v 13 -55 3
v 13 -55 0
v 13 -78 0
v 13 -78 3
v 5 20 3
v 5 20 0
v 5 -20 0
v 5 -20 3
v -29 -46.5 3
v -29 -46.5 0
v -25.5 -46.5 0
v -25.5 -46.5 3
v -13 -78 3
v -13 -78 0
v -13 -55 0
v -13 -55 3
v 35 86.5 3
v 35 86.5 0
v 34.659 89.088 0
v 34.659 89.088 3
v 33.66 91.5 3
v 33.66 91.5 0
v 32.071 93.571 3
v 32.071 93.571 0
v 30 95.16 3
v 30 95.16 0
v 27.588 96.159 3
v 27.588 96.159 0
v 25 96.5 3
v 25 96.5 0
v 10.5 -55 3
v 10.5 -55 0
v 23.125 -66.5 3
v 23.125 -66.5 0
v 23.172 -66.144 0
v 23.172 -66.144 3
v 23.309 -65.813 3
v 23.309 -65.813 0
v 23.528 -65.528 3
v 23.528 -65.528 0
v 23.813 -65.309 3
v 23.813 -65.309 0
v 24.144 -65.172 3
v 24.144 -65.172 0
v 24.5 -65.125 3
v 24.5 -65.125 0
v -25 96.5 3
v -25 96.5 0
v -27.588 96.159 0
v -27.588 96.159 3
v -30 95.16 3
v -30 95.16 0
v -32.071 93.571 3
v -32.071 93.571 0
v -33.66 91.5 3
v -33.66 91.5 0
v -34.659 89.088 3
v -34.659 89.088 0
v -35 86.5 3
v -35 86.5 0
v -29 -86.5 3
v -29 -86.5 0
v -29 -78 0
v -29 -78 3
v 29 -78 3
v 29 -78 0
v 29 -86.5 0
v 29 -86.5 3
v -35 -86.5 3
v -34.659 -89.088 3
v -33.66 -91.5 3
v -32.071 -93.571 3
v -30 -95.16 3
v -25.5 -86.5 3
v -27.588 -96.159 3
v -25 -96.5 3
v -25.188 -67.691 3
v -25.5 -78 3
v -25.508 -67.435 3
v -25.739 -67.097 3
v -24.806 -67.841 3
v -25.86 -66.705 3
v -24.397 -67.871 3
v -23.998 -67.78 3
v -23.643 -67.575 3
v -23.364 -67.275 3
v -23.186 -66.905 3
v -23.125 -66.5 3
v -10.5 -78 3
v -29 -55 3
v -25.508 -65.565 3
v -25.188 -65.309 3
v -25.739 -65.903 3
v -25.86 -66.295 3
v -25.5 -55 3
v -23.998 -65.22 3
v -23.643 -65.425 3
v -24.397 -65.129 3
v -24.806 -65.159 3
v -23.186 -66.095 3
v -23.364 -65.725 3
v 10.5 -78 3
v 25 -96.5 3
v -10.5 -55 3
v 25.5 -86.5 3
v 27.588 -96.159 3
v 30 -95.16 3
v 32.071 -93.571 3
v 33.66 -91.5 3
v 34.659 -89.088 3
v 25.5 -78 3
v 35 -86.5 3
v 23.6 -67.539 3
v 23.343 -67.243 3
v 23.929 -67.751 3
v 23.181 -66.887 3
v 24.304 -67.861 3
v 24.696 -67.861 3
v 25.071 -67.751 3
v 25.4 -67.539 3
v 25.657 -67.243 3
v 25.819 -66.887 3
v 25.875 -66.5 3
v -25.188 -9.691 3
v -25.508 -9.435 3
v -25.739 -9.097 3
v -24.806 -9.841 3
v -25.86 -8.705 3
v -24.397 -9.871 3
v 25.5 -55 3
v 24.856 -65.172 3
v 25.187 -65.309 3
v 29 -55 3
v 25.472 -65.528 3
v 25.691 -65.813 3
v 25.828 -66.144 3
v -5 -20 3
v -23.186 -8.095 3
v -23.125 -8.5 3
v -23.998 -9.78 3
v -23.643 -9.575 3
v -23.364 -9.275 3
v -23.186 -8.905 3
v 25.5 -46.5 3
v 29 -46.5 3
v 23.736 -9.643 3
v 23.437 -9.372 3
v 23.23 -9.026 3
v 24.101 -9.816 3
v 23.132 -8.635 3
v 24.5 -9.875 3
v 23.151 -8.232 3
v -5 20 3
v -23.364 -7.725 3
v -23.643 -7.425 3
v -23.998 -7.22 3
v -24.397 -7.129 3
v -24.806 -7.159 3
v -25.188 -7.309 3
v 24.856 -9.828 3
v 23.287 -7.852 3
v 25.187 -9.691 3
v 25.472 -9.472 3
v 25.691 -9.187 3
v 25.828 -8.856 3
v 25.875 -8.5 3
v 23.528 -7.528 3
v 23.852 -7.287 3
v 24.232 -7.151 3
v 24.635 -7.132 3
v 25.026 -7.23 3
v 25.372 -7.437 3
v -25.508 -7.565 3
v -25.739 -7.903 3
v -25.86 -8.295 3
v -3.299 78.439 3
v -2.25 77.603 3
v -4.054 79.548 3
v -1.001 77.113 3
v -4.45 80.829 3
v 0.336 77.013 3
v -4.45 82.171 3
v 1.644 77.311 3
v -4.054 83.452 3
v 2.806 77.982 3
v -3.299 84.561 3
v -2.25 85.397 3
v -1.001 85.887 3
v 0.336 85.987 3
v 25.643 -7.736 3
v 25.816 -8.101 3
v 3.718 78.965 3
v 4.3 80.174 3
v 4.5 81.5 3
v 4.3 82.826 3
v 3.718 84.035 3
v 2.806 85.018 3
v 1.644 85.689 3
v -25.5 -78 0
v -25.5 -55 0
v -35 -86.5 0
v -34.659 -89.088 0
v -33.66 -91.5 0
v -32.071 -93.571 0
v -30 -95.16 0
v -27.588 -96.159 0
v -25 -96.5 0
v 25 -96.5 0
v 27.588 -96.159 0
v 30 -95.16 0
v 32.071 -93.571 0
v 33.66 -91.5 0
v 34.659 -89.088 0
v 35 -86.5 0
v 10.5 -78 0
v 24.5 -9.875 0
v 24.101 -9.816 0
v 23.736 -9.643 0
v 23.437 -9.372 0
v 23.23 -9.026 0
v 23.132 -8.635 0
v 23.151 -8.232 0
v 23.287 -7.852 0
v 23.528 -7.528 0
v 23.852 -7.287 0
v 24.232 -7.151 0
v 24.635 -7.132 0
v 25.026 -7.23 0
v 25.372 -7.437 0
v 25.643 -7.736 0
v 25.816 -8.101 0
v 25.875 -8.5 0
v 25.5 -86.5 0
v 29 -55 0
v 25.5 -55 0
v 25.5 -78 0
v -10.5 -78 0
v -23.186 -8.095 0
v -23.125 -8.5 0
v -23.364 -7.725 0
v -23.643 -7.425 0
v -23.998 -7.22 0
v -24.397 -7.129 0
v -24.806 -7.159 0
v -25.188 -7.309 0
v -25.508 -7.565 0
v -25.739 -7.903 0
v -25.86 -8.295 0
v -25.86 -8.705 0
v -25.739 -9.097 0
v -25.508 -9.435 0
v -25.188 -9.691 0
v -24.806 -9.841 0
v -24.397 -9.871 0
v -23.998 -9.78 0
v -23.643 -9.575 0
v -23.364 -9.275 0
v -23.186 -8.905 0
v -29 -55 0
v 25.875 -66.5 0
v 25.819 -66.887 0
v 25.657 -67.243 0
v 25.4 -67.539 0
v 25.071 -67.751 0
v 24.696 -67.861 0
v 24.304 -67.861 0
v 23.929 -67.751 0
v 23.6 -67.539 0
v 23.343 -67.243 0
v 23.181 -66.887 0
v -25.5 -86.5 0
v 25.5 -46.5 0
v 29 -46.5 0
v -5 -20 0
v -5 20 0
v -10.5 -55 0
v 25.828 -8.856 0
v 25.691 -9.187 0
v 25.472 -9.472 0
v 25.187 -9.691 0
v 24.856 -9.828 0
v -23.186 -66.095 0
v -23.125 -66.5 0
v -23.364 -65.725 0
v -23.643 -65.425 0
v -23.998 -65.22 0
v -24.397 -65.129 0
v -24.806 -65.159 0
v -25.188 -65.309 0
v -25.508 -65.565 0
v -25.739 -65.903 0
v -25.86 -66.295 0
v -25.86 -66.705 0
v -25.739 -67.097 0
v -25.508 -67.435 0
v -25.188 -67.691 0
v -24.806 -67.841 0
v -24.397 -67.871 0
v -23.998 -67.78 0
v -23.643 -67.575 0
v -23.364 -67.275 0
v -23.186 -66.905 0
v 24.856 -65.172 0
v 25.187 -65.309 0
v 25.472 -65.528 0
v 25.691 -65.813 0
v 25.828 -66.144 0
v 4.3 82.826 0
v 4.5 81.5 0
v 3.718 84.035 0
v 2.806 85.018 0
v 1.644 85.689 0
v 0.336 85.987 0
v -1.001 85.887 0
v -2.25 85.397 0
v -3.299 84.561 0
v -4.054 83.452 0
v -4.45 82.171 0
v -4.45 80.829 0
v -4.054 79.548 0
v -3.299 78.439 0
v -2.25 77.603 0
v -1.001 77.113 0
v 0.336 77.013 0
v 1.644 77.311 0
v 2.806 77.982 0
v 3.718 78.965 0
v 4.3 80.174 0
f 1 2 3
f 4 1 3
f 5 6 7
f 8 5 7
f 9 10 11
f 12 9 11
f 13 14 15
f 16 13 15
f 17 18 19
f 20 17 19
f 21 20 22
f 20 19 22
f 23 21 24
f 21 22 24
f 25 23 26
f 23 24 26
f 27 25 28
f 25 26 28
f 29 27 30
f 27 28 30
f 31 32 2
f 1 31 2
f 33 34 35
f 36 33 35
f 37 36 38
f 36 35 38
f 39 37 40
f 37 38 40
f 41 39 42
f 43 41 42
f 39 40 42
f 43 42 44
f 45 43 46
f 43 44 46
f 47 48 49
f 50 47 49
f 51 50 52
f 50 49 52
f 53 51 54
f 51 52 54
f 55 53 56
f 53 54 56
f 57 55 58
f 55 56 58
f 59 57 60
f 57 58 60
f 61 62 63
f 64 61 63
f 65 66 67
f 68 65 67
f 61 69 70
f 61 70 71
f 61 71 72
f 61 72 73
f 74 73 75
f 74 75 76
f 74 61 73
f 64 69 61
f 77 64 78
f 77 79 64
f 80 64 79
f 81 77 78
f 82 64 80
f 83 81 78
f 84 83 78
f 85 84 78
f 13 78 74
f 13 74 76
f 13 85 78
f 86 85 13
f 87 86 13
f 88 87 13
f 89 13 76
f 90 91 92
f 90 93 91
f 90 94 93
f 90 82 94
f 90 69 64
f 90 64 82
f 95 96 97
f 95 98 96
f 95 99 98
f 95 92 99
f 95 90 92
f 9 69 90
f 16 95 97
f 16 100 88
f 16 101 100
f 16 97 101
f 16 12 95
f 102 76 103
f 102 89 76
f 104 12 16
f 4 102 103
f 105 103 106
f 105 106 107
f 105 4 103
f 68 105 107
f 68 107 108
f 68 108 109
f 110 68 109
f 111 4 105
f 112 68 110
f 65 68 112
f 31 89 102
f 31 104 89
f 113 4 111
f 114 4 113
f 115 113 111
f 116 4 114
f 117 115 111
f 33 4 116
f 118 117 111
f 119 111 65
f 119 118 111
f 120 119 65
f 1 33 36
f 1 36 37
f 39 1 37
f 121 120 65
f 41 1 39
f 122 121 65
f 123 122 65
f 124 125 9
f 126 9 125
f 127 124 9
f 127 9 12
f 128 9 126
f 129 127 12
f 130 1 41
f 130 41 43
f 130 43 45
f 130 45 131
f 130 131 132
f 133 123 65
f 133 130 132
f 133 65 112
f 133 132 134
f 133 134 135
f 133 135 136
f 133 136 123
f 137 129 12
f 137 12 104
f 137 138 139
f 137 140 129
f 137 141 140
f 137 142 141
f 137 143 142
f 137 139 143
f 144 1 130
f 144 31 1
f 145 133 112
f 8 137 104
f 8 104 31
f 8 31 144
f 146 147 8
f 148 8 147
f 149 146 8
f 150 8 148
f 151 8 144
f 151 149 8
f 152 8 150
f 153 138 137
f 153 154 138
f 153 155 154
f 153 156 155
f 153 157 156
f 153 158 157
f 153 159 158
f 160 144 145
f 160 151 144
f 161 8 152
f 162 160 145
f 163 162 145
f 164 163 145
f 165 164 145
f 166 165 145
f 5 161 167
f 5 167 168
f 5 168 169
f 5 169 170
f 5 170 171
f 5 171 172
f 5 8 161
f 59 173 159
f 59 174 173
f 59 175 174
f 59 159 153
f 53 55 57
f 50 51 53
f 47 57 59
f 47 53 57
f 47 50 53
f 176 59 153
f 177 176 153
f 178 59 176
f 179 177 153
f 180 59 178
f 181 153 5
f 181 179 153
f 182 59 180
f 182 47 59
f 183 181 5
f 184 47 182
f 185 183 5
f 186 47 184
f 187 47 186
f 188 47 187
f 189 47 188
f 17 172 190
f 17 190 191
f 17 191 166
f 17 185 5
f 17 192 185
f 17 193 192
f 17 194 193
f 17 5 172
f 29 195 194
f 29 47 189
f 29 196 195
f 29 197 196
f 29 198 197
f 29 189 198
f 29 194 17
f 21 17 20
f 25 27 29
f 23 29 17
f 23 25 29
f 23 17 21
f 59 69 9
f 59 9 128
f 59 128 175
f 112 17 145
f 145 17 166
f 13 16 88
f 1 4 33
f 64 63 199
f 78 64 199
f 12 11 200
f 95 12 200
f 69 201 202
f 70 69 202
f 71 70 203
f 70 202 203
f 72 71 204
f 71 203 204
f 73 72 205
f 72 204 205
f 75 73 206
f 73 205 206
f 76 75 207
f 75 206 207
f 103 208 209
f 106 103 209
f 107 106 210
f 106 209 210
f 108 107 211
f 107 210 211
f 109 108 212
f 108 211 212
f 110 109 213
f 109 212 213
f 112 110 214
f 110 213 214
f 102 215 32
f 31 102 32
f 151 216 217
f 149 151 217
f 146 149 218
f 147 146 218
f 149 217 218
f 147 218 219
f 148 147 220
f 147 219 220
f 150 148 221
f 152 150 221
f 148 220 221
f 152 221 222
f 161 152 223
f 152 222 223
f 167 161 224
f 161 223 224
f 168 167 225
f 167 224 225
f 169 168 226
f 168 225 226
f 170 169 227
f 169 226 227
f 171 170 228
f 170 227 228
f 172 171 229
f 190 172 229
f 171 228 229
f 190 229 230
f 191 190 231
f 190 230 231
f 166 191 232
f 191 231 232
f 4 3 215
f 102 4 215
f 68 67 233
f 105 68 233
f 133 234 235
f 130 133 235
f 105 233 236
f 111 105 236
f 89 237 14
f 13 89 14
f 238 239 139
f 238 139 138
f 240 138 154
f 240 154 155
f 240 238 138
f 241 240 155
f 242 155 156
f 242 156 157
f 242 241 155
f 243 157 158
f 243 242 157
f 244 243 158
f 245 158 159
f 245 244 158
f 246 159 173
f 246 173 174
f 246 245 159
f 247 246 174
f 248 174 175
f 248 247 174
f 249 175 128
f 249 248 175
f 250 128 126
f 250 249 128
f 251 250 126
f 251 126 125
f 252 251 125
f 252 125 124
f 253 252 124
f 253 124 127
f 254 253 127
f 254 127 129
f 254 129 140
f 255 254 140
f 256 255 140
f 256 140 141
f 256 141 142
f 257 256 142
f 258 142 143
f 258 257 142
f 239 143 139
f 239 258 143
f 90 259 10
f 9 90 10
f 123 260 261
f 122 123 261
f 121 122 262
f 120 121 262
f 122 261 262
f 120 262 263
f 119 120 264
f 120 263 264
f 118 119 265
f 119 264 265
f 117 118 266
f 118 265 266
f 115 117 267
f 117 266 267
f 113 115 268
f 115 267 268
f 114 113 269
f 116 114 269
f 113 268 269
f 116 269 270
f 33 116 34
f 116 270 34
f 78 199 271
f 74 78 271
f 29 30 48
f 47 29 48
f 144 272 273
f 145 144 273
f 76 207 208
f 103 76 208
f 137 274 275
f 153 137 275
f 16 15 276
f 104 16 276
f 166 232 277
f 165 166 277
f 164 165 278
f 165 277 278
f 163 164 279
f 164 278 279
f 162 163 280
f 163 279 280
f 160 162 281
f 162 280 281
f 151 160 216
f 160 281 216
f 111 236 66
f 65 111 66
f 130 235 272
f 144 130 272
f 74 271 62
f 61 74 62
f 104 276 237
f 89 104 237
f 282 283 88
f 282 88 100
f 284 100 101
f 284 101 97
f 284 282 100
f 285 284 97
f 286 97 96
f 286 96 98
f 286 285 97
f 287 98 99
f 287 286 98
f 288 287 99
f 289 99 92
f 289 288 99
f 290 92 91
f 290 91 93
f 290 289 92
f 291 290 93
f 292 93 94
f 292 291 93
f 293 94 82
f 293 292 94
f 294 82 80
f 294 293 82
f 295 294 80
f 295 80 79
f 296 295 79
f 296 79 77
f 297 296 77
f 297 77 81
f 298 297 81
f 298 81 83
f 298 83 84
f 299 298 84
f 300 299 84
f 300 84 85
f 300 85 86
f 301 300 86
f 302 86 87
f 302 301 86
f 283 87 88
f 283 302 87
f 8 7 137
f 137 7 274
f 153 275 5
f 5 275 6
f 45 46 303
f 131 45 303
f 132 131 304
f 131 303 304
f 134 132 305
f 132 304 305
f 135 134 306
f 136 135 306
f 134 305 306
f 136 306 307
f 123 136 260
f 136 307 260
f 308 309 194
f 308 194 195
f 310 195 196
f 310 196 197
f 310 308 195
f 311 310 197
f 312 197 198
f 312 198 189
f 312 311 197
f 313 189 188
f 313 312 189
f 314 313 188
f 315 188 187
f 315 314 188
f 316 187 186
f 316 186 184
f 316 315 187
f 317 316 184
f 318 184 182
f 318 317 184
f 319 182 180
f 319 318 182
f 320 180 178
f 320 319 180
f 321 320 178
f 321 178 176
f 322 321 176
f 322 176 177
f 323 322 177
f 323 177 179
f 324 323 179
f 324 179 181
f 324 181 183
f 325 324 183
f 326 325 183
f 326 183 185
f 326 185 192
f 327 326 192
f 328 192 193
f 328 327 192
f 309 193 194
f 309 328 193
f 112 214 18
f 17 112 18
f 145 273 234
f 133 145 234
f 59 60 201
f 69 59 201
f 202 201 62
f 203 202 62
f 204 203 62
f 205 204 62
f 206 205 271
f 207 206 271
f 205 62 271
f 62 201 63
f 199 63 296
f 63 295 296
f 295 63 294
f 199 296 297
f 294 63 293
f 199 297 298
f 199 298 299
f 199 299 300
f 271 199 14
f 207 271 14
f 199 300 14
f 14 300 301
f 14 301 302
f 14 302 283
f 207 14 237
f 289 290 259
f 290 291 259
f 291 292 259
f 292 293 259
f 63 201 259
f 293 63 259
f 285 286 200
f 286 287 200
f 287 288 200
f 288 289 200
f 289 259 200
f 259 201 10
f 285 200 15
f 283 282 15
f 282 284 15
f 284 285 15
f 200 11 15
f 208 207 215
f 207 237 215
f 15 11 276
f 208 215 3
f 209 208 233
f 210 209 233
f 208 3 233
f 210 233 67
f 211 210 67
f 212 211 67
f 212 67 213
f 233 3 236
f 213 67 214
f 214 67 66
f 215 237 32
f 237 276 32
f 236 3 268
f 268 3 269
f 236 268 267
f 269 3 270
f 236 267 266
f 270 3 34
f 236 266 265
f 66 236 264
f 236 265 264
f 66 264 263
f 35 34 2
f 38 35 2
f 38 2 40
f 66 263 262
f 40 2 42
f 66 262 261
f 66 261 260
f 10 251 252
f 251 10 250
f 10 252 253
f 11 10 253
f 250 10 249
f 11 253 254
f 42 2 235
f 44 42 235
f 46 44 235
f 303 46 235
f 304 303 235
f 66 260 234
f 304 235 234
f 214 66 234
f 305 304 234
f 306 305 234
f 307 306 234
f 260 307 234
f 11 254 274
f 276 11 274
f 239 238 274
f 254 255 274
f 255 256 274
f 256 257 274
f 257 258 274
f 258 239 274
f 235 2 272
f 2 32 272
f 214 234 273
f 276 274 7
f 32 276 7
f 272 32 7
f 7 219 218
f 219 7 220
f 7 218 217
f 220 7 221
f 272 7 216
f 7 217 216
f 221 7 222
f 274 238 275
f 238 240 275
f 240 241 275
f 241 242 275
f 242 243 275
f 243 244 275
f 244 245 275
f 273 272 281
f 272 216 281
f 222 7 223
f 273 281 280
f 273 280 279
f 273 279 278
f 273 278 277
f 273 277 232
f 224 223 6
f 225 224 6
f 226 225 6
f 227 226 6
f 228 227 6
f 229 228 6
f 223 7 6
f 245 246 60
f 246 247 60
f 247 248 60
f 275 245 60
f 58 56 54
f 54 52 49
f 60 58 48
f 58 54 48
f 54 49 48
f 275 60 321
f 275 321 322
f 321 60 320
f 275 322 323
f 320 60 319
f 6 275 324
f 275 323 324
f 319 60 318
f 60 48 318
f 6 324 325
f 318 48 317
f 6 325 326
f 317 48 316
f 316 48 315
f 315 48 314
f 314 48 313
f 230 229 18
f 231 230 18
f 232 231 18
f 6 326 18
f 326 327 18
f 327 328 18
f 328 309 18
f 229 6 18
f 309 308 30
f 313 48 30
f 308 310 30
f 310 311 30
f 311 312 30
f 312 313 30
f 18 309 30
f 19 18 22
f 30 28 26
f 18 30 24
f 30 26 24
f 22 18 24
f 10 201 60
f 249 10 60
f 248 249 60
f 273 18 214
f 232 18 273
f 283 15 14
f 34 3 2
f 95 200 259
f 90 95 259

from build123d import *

# Parameters (mm, degrees)
F0_R     = 1.375
F0_R_2   = 4.5
F0_W     = 40
F0_H     = 10
F0_W_2   = 10
F0_H_2   = 35
F0_W_3   = 15
F0_H_3   = 2
F0_W_4   = 2
F0_W_5   = 5.5
F0_H_4   = 11.5
F0_R_3   = 1
F1_DEPTH = 3


# Not quite as in the source:
# - a feature names something its author has since deleted; it is built from what else it names


with BuildPart() as f1:
    # F0 (on Top) → F1 (new body)
    with BuildSketch(Plane.XY):
        with BuildLine():
            Line((25, 96.5), (-25, 96.5))
            ThreePointArc((-25, 96.5), (-32.0710678119, 93.5710678119), (-35, 86.5))
            Line((-35, 86.5), (-35, -86.5))
            ThreePointArc((-35, -86.5), (-32.0710678119, -93.5710678119), (-25, -96.5))
            Line((-25, -96.5), (25, -96.5))
            ThreePointArc((25, -96.5), (32.0710678119, -93.5710678119), (35, -86.5))
            Line((35, -86.5), (35, 86.5))
            ThreePointArc((35, 86.5), (32.0710678119, 93.5710678119), (25, 96.5))
        make_face()
        Polygon((-29, -86.5), (-29, -78), (-29, -55), (-29, -46.5), (-25.5, -46.5), (-25.5, -55), (-18.5, -55), (-13, -55), (-10.5, -55), (-10.5, -66.5), (-10.5, -78), (-10.5, -86.5), (-25.5, -86.5), align=None, mode=Mode.SUBTRACT)
        with Locations((-24.5, -8.5)):
            Circle(F0_R, mode=Mode.SUBTRACT)
        Polygon((10.5, -78), (10.5, -66.5), (10.5, -55), (13, -55), (18.5, -55), (24.5, -55), (25.5, -55), (25.5, -46.5), (29, -46.5), (29, -55), (29, -78), (29, -86.5), (25.5, -86.5), (10.5, -86.5), align=None, mode=Mode.SUBTRACT)
        with BuildLine():
            ThreePointArc((25.875, -8.5), (25.4722718241, -9.4722718241), (24.5, -9.875))
            ThreePointArc((24.5, -9.875), (23.5277281759, -7.5277281759), (25.875, -8.5))
        make_face(mode=Mode.SUBTRACT)
        with BuildLine():
            ThreePointArc((26, -30), (25.5980762114, -31.5), (24.5, -32.5980762114))
            ThreePointArc((24.5, -32.5980762114), (23.1822131445, -32.9944612821), (21.8260869565, -32.7607839768))
            ThreePointArc((21.8260869565, -32.7607839768), (0, -52), (-21.8260869565, -32.7607839768))
            ThreePointArc((-21.8260869565, -32.7607839768), (-26, -30), (-21.8260869565, -27.2392160232))
            ThreePointArc((-21.8260869565, -27.2392160232), (-16.3398685927, -15.268785034), (-5, -8.5757147144))
            Line((-5, -8.5757147144), (-5, -5.5))
            Line((-5, -5.5), (-14, -5.5))
            Line((-14, -5.5), (-14, -8.5))
            ThreePointArc((-14, -8.5), (-17, -11.5), (-20, -8.5))
            Line((-20, -8.5), (-20, -5.5))
            Line((-20, -5.5), (-30, -5.5))
            Line((-30, -5.5), (-32, -5.5))
            Line((-32, -5.5), (-32, 6.5))
            Line((-32, 6.5), (-32, 41.5))
            Line((-32, 41.5), (-32, 53.5))
            Line((-32, 53.5), (-30, 53.5))
            Line((-30, 53.5), (-30, 56.5))
            ThreePointArc((-30, 56.5), (-27, 59.5), (-24, 56.5))
            Line((-24, 56.5), (-24, 53.5))
            Line((-24, 53.5), (-20, 53.5))
            Line((-20, 53.5), (20, 53.5))
            Line((20, 53.5), (32, 53.5))
            Line((32, 53.5), (32, 41.5))
            Line((32, 41.5), (32, 6.5))
            Line((32, 6.5), (32, -5.5))
            Line((32, -5.5), (20, -5.5))
            Line((20, -5.5), (5, -5.5))
            Line((5, -5.5), (5, -8.5757147144))
            ThreePointArc((5, -8.5757147144), (16.3398685927, -15.268785034), (21.8260869565, -27.2392160232))
            ThreePointArc((21.8260869565, -27.2392160232), (23.1822131445, -27.0055387179), (24.5, -27.4019237886))
            ThreePointArc((24.5, -27.4019237886), (25.5980762114, -28.5), (26, -30))
        make_face(mode=Mode.SUBTRACT)
        with Locations((0, 81.5)):
            Circle(F0_R_2, mode=Mode.SUBTRACT)
        Polygon((5, 20), (5, 6.5), (20, 6.5), (20, 41.5), (-20, 41.5), (-20, 6.5), (-5, 6.5), (-5, 20), align=None)
        with BuildLine():
            ThreePointArc((-20, -30), (0, -50), (20, -30))
            ThreePointArc((20, -30), (15.8113883008, -17.7525512861), (5, -10.635083269))
            Line((5, -10.635083269), (5, -20))
            Line((5, -20), (-5, -20))
            Line((-5, -20), (-5, -10.635083269))
            ThreePointArc((-5, -10.635083269), (-15.8113883008, -17.7525512861), (-20, -30))
        make_face()
        with Locations((0, 46.5)):
            Rectangle(F0_W, F0_H)
        with Locations((-25, 24)):
            Rectangle(F0_W_2, F0_H_2)
        with Locations((25, 24)):
            Rectangle(F0_W_2, F0_H_2)
        Polygon((-29, -55), (-29, -78), (-25.5, -78), (-18.5, -78), (-18.5, -66.5), (-18.5, -55), (-25.5, -55), align=None)
        with Locations((-24.5, -66.5)):
            Circle(F0_R, mode=Mode.SUBTRACT)
        with BuildLine():
            Line((23.125, -66.5), (18.5, -66.5))
            Line((18.5, -66.5), (18.5, -78))
            Line((18.5, -78), (25.5, -78))
            Line((25.5, -78), (29, -78))
            Line((29, -78), (29, -55))
            Line((29, -55), (25.5, -55))
            Line((25.5, -55), (24.5, -55))
            Line((24.5, -55), (24.5, -65.125))
            ThreePointArc((24.5, -65.125), (25.4722718241, -65.5277281759), (25.875, -66.5))
            ThreePointArc((25.875, -66.5), (24.5, -67.875), (23.125, -66.5))
        make_face()
        with Locations((-12.5, 1.5)):
            Rectangle(F0_W_3, F0_H)
        with Locations((12.5, 1.5)):
            Rectangle(F0_W_3, F0_H)
        Polygon((-18.5, -78), (-25.5, -78), (-25.5, -86.5), (-10.5, -86.5), (-10.5, -78), (-13, -78), align=None)
        Polygon((13, -78), (10.5, -78), (10.5, -86.5), (25.5, -86.5), (25.5, -78), (18.5, -78), align=None)
        with BuildLine():
            ThreePointArc((-21.8260869565, -32.7607839768), (0, -52), (21.8260869565, -32.7607839768))
            ThreePointArc((21.8260869565, -32.7607839768), (20.4978270313, -31.6550318531), (20, -30))
            ThreePointArc((20, -30), (0, -50), (-20, -30))
            ThreePointArc((-20, -30), (-20.4978270313, -31.6550318531), (-21.8260869565, -32.7607839768))
        make_face()
        with Locations((25, 46.5)):
            Rectangle(F0_W_2, F0_H)
        with Locations((-25, 46.5)):
            Rectangle(F0_W_2, F0_H)
        with Locations((-25, 1.5)):
            Rectangle(F0_W_2, F0_H)
        with Locations((25, 1.5)):
            Rectangle(F0_W_2, F0_H)
        with Locations((0, 52.5)):
            Rectangle(F0_W, F0_H_3)
        with Locations((31, 24)):
            Rectangle(F0_W_4, F0_H_2)
        with Locations((-31, 24)):
            Rectangle(F0_W_4, F0_H_2)
        with BuildLine():
            Line((18.5, -55), (18.5, -66.5))
            Line((18.5, -66.5), (23.125, -66.5))
            ThreePointArc((23.125, -66.5), (23.5277281759, -65.5277281759), (24.5, -65.125))
            Line((24.5, -65.125), (24.5, -55))
            Line((24.5, -55), (18.5, -55))
        make_face()
        with Locations((-15.75, -72.25)):
            Rectangle(F0_W_5, F0_H_4)
        with Locations((-15.75, -60.75)):
            Rectangle(F0_W_5, F0_H_4)
        with Locations((15.75, -72.25)):
            Rectangle(F0_W_5, F0_H_4)
        with Locations((15.75, -60.75)):
            Rectangle(F0_W_5, F0_H_4)
        with BuildLine():
            ThreePointArc((-5, -8.5757147144), (-16.3398685927, -15.268785034), (-21.8260869565, -27.2392160232))
            ThreePointArc((-21.8260869565, -27.2392160232), (-20.4978270313, -28.3449681469), (-20, -30))
            ThreePointArc((-20, -30), (-15.8113883008, -17.7525512861), (-5, -10.635083269))
            Line((-5, -10.635083269), (-5, -8.5757147144))
        make_face()
        with BuildLine():
            ThreePointArc((20, -30), (20.4978270313, -28.3449681469), (21.8260869565, -27.2392160232))
            ThreePointArc((21.8260869565, -27.2392160232), (16.3398685927, -15.268785034), (5, -8.5757147144))
            Line((5, -8.5757147144), (5, -10.635083269))
            ThreePointArc((5, -10.635083269), (15.8113883008, -17.7525512861), (20, -30))
        make_face()
        Polygon((30, 41.5), (32, 41.5), (32, 53.5), (20, 53.5), (20, 51.5), (30, 51.5), align=None)
        Polygon((20, -3.5), (20, -5.5), (32, -5.5), (32, 6.5), (30, 6.5), (30, -3.5), align=None)
        Polygon((-14, -5.5), (-5, -5.5), (-5, -3.5), (-20, -3.5), (-20, -5.5), (-17, -5.5), align=None)
        with Locations((12.5, -4.5)):
            Rectangle(F0_W_3, F0_H_3)
        with BuildLine():
            ThreePointArc((-30, 56.5), (-29.1213203519, 54.3786796648), (-27.0000000236, 53.5))
            ThreePointArc((-27.0000000236, 53.5), (-24.8786796648, 54.3786796481), (-24, 56.5))
            ThreePointArc((-24, 56.5), (-27, 59.5), (-30, 56.5))
        make_face()
        with Locations((-27, 56.5)):
            Circle(F0_R_3, mode=Mode.SUBTRACT)
        with BuildLine():
            ThreePointArc((-14, -8.5), (-14.8786796564, -6.3786796564), (-17, -5.5))
            ThreePointArc((-17, -5.5), (-19.1213203436, -6.3786796564), (-20, -8.5))
            ThreePointArc((-20, -8.5), (-17, -11.5), (-14, -8.5))
        make_face()
        with Locations((-17, -8.5)):
            Circle(F0_R_3, mode=Mode.SUBTRACT)
        Polygon((-32, 41.5), (-30, 41.5), (-30, 51.5), (-30, 53.5), (-32, 53.5), align=None)
        Polygon((-30, -5.5), (-30, -3.5), (-30, 6.5), (-32, 6.5), (-32, -5.5), align=None)
        with BuildLine():
            ThreePointArc((-21.8260869565, -27.2392160232), (-26, -30), (-21.8260869565, -32.7607839768))
            ThreePointArc((-21.8260869565, -32.7607839768), (-21.9564786913, -31.3831281496), (-22, -30))
            ThreePointArc((-22, -30), (-21.9564786913, -28.6168718504), (-21.8260869565, -27.2392160232))
        make_face()
        with Locations((-23, -30)):
            Circle(F0_R_3, mode=Mode.SUBTRACT)
        Polygon((-30, 51.5), (-20, 51.5), (-20, 53.5), (-24, 53.5), (-27.0000000236, 53.5), (-30, 53.5), align=None)
        with Locations((-25, -4.5)):
            Rectangle(F0_W_2, F0_H_3)
        with BuildLine():
            ThreePointArc((21.8260869565, -32.7607839768), (23.1822131445, -32.9944612821), (24.5, -32.5980762114))
            Line((24.5, -32.5980762114), (24.5, -27.4019237886))
            ThreePointArc((24.5, -27.4019237886), (23.1822131445, -27.0055387179), (21.8260869565, -27.2392160232))
            ThreePointArc((21.8260869565, -27.2392160232), (21.9564786913, -28.6168718504), (22, -30))
            ThreePointArc((22, -30), (21.9564786913, -31.3831281496), (21.8260869565, -32.7607839768))
        make_face()
        with BuildLine():
            ThreePointArc((24, -30), (23, -31), (22, -30))
            ThreePointArc((22, -30), (23, -29), (24, -30))
        make_face(mode=Mode.SUBTRACT)
        with BuildLine():
            ThreePointArc((-22, -30), (-21.9564786913, -31.3831281496), (-21.8260869565, -32.7607839768))
            ThreePointArc((-21.8260869565, -32.7607839768), (-20.4978270313, -31.6550318531), (-20, -30))
            ThreePointArc((-20, -30), (-20.4978270313, -28.3449681469), (-21.8260869565, -27.2392160232))
            ThreePointArc((-21.8260869565, -27.2392160232), (-21.9564786913, -28.6168718504), (-22, -30))
        make_face()
        with BuildLine():
            ThreePointArc((20, -30), (20.4978270313, -31.6550318531), (21.8260869565, -32.7607839768))
            ThreePointArc((21.8260869565, -32.7607839768), (21.9564786913, -31.3831281496), (22, -30))
            ThreePointArc((22, -30), (21.9564786913, -28.6168718504), (21.8260869565, -27.2392160232))
            ThreePointArc((21.8260869565, -27.2392160232), (20.4978270313, -28.3449681469), (20, -30))
        make_face()
        with BuildLine():
            Line((24.5, -27.4019237886), (24.5, -32.5980762114))
            ThreePointArc((24.5, -32.5980762114), (25.5980762114, -31.5), (26, -30))
            ThreePointArc((26, -30), (25.5980762114, -28.5), (24.5, -27.4019237886))
        make_face()
        with Locations((-23, -30)):
            Circle(F0_R_3)
        with BuildLine():
            ThreePointArc((24, -30), (23, -29), (22, -30))
            ThreePointArc((22, -30), (23, -31), (24, -30))
        make_face()
        with Locations((-27, 56.5)):
            Circle(F0_R_3)
        with Locations((-17, -8.5)):
            Circle(F0_R_3)
        with BuildLine():
            Line((-27.0000000236, 53.5), (-24, 53.5))
            Line((-24, 53.5), (-24, 56.5))
            ThreePointArc((-24, 56.5), (-24.8786796648, 54.3786796481), (-27.0000000236, 53.5))
        make_face()
        with BuildLine():
            Line((-30, 56.5), (-30, 53.5))
            Line((-30, 53.5), (-27.0000000236, 53.5))
            ThreePointArc((-27.0000000236, 53.5), (-29.1213203519, 54.3786796648), (-30, 56.5))
        make_face()
        with BuildLine():
            ThreePointArc((-20, -8.5), (-19.1213203436, -6.3786796564), (-17, -5.5))
            Line((-17, -5.5), (-20, -5.5))
            Line((-20, -5.5), (-20, -8.5))
        make_face()
        with BuildLine():
            Line((-14, -8.5), (-14, -5.5))
            Line((-14, -5.5), (-17, -5.5))
            ThreePointArc((-17, -5.5), (-14.8786796564, -6.3786796564), (-14, -8.5))
        make_face()
    extrude(amount=F1_DEPTH)


solid = f1.part
